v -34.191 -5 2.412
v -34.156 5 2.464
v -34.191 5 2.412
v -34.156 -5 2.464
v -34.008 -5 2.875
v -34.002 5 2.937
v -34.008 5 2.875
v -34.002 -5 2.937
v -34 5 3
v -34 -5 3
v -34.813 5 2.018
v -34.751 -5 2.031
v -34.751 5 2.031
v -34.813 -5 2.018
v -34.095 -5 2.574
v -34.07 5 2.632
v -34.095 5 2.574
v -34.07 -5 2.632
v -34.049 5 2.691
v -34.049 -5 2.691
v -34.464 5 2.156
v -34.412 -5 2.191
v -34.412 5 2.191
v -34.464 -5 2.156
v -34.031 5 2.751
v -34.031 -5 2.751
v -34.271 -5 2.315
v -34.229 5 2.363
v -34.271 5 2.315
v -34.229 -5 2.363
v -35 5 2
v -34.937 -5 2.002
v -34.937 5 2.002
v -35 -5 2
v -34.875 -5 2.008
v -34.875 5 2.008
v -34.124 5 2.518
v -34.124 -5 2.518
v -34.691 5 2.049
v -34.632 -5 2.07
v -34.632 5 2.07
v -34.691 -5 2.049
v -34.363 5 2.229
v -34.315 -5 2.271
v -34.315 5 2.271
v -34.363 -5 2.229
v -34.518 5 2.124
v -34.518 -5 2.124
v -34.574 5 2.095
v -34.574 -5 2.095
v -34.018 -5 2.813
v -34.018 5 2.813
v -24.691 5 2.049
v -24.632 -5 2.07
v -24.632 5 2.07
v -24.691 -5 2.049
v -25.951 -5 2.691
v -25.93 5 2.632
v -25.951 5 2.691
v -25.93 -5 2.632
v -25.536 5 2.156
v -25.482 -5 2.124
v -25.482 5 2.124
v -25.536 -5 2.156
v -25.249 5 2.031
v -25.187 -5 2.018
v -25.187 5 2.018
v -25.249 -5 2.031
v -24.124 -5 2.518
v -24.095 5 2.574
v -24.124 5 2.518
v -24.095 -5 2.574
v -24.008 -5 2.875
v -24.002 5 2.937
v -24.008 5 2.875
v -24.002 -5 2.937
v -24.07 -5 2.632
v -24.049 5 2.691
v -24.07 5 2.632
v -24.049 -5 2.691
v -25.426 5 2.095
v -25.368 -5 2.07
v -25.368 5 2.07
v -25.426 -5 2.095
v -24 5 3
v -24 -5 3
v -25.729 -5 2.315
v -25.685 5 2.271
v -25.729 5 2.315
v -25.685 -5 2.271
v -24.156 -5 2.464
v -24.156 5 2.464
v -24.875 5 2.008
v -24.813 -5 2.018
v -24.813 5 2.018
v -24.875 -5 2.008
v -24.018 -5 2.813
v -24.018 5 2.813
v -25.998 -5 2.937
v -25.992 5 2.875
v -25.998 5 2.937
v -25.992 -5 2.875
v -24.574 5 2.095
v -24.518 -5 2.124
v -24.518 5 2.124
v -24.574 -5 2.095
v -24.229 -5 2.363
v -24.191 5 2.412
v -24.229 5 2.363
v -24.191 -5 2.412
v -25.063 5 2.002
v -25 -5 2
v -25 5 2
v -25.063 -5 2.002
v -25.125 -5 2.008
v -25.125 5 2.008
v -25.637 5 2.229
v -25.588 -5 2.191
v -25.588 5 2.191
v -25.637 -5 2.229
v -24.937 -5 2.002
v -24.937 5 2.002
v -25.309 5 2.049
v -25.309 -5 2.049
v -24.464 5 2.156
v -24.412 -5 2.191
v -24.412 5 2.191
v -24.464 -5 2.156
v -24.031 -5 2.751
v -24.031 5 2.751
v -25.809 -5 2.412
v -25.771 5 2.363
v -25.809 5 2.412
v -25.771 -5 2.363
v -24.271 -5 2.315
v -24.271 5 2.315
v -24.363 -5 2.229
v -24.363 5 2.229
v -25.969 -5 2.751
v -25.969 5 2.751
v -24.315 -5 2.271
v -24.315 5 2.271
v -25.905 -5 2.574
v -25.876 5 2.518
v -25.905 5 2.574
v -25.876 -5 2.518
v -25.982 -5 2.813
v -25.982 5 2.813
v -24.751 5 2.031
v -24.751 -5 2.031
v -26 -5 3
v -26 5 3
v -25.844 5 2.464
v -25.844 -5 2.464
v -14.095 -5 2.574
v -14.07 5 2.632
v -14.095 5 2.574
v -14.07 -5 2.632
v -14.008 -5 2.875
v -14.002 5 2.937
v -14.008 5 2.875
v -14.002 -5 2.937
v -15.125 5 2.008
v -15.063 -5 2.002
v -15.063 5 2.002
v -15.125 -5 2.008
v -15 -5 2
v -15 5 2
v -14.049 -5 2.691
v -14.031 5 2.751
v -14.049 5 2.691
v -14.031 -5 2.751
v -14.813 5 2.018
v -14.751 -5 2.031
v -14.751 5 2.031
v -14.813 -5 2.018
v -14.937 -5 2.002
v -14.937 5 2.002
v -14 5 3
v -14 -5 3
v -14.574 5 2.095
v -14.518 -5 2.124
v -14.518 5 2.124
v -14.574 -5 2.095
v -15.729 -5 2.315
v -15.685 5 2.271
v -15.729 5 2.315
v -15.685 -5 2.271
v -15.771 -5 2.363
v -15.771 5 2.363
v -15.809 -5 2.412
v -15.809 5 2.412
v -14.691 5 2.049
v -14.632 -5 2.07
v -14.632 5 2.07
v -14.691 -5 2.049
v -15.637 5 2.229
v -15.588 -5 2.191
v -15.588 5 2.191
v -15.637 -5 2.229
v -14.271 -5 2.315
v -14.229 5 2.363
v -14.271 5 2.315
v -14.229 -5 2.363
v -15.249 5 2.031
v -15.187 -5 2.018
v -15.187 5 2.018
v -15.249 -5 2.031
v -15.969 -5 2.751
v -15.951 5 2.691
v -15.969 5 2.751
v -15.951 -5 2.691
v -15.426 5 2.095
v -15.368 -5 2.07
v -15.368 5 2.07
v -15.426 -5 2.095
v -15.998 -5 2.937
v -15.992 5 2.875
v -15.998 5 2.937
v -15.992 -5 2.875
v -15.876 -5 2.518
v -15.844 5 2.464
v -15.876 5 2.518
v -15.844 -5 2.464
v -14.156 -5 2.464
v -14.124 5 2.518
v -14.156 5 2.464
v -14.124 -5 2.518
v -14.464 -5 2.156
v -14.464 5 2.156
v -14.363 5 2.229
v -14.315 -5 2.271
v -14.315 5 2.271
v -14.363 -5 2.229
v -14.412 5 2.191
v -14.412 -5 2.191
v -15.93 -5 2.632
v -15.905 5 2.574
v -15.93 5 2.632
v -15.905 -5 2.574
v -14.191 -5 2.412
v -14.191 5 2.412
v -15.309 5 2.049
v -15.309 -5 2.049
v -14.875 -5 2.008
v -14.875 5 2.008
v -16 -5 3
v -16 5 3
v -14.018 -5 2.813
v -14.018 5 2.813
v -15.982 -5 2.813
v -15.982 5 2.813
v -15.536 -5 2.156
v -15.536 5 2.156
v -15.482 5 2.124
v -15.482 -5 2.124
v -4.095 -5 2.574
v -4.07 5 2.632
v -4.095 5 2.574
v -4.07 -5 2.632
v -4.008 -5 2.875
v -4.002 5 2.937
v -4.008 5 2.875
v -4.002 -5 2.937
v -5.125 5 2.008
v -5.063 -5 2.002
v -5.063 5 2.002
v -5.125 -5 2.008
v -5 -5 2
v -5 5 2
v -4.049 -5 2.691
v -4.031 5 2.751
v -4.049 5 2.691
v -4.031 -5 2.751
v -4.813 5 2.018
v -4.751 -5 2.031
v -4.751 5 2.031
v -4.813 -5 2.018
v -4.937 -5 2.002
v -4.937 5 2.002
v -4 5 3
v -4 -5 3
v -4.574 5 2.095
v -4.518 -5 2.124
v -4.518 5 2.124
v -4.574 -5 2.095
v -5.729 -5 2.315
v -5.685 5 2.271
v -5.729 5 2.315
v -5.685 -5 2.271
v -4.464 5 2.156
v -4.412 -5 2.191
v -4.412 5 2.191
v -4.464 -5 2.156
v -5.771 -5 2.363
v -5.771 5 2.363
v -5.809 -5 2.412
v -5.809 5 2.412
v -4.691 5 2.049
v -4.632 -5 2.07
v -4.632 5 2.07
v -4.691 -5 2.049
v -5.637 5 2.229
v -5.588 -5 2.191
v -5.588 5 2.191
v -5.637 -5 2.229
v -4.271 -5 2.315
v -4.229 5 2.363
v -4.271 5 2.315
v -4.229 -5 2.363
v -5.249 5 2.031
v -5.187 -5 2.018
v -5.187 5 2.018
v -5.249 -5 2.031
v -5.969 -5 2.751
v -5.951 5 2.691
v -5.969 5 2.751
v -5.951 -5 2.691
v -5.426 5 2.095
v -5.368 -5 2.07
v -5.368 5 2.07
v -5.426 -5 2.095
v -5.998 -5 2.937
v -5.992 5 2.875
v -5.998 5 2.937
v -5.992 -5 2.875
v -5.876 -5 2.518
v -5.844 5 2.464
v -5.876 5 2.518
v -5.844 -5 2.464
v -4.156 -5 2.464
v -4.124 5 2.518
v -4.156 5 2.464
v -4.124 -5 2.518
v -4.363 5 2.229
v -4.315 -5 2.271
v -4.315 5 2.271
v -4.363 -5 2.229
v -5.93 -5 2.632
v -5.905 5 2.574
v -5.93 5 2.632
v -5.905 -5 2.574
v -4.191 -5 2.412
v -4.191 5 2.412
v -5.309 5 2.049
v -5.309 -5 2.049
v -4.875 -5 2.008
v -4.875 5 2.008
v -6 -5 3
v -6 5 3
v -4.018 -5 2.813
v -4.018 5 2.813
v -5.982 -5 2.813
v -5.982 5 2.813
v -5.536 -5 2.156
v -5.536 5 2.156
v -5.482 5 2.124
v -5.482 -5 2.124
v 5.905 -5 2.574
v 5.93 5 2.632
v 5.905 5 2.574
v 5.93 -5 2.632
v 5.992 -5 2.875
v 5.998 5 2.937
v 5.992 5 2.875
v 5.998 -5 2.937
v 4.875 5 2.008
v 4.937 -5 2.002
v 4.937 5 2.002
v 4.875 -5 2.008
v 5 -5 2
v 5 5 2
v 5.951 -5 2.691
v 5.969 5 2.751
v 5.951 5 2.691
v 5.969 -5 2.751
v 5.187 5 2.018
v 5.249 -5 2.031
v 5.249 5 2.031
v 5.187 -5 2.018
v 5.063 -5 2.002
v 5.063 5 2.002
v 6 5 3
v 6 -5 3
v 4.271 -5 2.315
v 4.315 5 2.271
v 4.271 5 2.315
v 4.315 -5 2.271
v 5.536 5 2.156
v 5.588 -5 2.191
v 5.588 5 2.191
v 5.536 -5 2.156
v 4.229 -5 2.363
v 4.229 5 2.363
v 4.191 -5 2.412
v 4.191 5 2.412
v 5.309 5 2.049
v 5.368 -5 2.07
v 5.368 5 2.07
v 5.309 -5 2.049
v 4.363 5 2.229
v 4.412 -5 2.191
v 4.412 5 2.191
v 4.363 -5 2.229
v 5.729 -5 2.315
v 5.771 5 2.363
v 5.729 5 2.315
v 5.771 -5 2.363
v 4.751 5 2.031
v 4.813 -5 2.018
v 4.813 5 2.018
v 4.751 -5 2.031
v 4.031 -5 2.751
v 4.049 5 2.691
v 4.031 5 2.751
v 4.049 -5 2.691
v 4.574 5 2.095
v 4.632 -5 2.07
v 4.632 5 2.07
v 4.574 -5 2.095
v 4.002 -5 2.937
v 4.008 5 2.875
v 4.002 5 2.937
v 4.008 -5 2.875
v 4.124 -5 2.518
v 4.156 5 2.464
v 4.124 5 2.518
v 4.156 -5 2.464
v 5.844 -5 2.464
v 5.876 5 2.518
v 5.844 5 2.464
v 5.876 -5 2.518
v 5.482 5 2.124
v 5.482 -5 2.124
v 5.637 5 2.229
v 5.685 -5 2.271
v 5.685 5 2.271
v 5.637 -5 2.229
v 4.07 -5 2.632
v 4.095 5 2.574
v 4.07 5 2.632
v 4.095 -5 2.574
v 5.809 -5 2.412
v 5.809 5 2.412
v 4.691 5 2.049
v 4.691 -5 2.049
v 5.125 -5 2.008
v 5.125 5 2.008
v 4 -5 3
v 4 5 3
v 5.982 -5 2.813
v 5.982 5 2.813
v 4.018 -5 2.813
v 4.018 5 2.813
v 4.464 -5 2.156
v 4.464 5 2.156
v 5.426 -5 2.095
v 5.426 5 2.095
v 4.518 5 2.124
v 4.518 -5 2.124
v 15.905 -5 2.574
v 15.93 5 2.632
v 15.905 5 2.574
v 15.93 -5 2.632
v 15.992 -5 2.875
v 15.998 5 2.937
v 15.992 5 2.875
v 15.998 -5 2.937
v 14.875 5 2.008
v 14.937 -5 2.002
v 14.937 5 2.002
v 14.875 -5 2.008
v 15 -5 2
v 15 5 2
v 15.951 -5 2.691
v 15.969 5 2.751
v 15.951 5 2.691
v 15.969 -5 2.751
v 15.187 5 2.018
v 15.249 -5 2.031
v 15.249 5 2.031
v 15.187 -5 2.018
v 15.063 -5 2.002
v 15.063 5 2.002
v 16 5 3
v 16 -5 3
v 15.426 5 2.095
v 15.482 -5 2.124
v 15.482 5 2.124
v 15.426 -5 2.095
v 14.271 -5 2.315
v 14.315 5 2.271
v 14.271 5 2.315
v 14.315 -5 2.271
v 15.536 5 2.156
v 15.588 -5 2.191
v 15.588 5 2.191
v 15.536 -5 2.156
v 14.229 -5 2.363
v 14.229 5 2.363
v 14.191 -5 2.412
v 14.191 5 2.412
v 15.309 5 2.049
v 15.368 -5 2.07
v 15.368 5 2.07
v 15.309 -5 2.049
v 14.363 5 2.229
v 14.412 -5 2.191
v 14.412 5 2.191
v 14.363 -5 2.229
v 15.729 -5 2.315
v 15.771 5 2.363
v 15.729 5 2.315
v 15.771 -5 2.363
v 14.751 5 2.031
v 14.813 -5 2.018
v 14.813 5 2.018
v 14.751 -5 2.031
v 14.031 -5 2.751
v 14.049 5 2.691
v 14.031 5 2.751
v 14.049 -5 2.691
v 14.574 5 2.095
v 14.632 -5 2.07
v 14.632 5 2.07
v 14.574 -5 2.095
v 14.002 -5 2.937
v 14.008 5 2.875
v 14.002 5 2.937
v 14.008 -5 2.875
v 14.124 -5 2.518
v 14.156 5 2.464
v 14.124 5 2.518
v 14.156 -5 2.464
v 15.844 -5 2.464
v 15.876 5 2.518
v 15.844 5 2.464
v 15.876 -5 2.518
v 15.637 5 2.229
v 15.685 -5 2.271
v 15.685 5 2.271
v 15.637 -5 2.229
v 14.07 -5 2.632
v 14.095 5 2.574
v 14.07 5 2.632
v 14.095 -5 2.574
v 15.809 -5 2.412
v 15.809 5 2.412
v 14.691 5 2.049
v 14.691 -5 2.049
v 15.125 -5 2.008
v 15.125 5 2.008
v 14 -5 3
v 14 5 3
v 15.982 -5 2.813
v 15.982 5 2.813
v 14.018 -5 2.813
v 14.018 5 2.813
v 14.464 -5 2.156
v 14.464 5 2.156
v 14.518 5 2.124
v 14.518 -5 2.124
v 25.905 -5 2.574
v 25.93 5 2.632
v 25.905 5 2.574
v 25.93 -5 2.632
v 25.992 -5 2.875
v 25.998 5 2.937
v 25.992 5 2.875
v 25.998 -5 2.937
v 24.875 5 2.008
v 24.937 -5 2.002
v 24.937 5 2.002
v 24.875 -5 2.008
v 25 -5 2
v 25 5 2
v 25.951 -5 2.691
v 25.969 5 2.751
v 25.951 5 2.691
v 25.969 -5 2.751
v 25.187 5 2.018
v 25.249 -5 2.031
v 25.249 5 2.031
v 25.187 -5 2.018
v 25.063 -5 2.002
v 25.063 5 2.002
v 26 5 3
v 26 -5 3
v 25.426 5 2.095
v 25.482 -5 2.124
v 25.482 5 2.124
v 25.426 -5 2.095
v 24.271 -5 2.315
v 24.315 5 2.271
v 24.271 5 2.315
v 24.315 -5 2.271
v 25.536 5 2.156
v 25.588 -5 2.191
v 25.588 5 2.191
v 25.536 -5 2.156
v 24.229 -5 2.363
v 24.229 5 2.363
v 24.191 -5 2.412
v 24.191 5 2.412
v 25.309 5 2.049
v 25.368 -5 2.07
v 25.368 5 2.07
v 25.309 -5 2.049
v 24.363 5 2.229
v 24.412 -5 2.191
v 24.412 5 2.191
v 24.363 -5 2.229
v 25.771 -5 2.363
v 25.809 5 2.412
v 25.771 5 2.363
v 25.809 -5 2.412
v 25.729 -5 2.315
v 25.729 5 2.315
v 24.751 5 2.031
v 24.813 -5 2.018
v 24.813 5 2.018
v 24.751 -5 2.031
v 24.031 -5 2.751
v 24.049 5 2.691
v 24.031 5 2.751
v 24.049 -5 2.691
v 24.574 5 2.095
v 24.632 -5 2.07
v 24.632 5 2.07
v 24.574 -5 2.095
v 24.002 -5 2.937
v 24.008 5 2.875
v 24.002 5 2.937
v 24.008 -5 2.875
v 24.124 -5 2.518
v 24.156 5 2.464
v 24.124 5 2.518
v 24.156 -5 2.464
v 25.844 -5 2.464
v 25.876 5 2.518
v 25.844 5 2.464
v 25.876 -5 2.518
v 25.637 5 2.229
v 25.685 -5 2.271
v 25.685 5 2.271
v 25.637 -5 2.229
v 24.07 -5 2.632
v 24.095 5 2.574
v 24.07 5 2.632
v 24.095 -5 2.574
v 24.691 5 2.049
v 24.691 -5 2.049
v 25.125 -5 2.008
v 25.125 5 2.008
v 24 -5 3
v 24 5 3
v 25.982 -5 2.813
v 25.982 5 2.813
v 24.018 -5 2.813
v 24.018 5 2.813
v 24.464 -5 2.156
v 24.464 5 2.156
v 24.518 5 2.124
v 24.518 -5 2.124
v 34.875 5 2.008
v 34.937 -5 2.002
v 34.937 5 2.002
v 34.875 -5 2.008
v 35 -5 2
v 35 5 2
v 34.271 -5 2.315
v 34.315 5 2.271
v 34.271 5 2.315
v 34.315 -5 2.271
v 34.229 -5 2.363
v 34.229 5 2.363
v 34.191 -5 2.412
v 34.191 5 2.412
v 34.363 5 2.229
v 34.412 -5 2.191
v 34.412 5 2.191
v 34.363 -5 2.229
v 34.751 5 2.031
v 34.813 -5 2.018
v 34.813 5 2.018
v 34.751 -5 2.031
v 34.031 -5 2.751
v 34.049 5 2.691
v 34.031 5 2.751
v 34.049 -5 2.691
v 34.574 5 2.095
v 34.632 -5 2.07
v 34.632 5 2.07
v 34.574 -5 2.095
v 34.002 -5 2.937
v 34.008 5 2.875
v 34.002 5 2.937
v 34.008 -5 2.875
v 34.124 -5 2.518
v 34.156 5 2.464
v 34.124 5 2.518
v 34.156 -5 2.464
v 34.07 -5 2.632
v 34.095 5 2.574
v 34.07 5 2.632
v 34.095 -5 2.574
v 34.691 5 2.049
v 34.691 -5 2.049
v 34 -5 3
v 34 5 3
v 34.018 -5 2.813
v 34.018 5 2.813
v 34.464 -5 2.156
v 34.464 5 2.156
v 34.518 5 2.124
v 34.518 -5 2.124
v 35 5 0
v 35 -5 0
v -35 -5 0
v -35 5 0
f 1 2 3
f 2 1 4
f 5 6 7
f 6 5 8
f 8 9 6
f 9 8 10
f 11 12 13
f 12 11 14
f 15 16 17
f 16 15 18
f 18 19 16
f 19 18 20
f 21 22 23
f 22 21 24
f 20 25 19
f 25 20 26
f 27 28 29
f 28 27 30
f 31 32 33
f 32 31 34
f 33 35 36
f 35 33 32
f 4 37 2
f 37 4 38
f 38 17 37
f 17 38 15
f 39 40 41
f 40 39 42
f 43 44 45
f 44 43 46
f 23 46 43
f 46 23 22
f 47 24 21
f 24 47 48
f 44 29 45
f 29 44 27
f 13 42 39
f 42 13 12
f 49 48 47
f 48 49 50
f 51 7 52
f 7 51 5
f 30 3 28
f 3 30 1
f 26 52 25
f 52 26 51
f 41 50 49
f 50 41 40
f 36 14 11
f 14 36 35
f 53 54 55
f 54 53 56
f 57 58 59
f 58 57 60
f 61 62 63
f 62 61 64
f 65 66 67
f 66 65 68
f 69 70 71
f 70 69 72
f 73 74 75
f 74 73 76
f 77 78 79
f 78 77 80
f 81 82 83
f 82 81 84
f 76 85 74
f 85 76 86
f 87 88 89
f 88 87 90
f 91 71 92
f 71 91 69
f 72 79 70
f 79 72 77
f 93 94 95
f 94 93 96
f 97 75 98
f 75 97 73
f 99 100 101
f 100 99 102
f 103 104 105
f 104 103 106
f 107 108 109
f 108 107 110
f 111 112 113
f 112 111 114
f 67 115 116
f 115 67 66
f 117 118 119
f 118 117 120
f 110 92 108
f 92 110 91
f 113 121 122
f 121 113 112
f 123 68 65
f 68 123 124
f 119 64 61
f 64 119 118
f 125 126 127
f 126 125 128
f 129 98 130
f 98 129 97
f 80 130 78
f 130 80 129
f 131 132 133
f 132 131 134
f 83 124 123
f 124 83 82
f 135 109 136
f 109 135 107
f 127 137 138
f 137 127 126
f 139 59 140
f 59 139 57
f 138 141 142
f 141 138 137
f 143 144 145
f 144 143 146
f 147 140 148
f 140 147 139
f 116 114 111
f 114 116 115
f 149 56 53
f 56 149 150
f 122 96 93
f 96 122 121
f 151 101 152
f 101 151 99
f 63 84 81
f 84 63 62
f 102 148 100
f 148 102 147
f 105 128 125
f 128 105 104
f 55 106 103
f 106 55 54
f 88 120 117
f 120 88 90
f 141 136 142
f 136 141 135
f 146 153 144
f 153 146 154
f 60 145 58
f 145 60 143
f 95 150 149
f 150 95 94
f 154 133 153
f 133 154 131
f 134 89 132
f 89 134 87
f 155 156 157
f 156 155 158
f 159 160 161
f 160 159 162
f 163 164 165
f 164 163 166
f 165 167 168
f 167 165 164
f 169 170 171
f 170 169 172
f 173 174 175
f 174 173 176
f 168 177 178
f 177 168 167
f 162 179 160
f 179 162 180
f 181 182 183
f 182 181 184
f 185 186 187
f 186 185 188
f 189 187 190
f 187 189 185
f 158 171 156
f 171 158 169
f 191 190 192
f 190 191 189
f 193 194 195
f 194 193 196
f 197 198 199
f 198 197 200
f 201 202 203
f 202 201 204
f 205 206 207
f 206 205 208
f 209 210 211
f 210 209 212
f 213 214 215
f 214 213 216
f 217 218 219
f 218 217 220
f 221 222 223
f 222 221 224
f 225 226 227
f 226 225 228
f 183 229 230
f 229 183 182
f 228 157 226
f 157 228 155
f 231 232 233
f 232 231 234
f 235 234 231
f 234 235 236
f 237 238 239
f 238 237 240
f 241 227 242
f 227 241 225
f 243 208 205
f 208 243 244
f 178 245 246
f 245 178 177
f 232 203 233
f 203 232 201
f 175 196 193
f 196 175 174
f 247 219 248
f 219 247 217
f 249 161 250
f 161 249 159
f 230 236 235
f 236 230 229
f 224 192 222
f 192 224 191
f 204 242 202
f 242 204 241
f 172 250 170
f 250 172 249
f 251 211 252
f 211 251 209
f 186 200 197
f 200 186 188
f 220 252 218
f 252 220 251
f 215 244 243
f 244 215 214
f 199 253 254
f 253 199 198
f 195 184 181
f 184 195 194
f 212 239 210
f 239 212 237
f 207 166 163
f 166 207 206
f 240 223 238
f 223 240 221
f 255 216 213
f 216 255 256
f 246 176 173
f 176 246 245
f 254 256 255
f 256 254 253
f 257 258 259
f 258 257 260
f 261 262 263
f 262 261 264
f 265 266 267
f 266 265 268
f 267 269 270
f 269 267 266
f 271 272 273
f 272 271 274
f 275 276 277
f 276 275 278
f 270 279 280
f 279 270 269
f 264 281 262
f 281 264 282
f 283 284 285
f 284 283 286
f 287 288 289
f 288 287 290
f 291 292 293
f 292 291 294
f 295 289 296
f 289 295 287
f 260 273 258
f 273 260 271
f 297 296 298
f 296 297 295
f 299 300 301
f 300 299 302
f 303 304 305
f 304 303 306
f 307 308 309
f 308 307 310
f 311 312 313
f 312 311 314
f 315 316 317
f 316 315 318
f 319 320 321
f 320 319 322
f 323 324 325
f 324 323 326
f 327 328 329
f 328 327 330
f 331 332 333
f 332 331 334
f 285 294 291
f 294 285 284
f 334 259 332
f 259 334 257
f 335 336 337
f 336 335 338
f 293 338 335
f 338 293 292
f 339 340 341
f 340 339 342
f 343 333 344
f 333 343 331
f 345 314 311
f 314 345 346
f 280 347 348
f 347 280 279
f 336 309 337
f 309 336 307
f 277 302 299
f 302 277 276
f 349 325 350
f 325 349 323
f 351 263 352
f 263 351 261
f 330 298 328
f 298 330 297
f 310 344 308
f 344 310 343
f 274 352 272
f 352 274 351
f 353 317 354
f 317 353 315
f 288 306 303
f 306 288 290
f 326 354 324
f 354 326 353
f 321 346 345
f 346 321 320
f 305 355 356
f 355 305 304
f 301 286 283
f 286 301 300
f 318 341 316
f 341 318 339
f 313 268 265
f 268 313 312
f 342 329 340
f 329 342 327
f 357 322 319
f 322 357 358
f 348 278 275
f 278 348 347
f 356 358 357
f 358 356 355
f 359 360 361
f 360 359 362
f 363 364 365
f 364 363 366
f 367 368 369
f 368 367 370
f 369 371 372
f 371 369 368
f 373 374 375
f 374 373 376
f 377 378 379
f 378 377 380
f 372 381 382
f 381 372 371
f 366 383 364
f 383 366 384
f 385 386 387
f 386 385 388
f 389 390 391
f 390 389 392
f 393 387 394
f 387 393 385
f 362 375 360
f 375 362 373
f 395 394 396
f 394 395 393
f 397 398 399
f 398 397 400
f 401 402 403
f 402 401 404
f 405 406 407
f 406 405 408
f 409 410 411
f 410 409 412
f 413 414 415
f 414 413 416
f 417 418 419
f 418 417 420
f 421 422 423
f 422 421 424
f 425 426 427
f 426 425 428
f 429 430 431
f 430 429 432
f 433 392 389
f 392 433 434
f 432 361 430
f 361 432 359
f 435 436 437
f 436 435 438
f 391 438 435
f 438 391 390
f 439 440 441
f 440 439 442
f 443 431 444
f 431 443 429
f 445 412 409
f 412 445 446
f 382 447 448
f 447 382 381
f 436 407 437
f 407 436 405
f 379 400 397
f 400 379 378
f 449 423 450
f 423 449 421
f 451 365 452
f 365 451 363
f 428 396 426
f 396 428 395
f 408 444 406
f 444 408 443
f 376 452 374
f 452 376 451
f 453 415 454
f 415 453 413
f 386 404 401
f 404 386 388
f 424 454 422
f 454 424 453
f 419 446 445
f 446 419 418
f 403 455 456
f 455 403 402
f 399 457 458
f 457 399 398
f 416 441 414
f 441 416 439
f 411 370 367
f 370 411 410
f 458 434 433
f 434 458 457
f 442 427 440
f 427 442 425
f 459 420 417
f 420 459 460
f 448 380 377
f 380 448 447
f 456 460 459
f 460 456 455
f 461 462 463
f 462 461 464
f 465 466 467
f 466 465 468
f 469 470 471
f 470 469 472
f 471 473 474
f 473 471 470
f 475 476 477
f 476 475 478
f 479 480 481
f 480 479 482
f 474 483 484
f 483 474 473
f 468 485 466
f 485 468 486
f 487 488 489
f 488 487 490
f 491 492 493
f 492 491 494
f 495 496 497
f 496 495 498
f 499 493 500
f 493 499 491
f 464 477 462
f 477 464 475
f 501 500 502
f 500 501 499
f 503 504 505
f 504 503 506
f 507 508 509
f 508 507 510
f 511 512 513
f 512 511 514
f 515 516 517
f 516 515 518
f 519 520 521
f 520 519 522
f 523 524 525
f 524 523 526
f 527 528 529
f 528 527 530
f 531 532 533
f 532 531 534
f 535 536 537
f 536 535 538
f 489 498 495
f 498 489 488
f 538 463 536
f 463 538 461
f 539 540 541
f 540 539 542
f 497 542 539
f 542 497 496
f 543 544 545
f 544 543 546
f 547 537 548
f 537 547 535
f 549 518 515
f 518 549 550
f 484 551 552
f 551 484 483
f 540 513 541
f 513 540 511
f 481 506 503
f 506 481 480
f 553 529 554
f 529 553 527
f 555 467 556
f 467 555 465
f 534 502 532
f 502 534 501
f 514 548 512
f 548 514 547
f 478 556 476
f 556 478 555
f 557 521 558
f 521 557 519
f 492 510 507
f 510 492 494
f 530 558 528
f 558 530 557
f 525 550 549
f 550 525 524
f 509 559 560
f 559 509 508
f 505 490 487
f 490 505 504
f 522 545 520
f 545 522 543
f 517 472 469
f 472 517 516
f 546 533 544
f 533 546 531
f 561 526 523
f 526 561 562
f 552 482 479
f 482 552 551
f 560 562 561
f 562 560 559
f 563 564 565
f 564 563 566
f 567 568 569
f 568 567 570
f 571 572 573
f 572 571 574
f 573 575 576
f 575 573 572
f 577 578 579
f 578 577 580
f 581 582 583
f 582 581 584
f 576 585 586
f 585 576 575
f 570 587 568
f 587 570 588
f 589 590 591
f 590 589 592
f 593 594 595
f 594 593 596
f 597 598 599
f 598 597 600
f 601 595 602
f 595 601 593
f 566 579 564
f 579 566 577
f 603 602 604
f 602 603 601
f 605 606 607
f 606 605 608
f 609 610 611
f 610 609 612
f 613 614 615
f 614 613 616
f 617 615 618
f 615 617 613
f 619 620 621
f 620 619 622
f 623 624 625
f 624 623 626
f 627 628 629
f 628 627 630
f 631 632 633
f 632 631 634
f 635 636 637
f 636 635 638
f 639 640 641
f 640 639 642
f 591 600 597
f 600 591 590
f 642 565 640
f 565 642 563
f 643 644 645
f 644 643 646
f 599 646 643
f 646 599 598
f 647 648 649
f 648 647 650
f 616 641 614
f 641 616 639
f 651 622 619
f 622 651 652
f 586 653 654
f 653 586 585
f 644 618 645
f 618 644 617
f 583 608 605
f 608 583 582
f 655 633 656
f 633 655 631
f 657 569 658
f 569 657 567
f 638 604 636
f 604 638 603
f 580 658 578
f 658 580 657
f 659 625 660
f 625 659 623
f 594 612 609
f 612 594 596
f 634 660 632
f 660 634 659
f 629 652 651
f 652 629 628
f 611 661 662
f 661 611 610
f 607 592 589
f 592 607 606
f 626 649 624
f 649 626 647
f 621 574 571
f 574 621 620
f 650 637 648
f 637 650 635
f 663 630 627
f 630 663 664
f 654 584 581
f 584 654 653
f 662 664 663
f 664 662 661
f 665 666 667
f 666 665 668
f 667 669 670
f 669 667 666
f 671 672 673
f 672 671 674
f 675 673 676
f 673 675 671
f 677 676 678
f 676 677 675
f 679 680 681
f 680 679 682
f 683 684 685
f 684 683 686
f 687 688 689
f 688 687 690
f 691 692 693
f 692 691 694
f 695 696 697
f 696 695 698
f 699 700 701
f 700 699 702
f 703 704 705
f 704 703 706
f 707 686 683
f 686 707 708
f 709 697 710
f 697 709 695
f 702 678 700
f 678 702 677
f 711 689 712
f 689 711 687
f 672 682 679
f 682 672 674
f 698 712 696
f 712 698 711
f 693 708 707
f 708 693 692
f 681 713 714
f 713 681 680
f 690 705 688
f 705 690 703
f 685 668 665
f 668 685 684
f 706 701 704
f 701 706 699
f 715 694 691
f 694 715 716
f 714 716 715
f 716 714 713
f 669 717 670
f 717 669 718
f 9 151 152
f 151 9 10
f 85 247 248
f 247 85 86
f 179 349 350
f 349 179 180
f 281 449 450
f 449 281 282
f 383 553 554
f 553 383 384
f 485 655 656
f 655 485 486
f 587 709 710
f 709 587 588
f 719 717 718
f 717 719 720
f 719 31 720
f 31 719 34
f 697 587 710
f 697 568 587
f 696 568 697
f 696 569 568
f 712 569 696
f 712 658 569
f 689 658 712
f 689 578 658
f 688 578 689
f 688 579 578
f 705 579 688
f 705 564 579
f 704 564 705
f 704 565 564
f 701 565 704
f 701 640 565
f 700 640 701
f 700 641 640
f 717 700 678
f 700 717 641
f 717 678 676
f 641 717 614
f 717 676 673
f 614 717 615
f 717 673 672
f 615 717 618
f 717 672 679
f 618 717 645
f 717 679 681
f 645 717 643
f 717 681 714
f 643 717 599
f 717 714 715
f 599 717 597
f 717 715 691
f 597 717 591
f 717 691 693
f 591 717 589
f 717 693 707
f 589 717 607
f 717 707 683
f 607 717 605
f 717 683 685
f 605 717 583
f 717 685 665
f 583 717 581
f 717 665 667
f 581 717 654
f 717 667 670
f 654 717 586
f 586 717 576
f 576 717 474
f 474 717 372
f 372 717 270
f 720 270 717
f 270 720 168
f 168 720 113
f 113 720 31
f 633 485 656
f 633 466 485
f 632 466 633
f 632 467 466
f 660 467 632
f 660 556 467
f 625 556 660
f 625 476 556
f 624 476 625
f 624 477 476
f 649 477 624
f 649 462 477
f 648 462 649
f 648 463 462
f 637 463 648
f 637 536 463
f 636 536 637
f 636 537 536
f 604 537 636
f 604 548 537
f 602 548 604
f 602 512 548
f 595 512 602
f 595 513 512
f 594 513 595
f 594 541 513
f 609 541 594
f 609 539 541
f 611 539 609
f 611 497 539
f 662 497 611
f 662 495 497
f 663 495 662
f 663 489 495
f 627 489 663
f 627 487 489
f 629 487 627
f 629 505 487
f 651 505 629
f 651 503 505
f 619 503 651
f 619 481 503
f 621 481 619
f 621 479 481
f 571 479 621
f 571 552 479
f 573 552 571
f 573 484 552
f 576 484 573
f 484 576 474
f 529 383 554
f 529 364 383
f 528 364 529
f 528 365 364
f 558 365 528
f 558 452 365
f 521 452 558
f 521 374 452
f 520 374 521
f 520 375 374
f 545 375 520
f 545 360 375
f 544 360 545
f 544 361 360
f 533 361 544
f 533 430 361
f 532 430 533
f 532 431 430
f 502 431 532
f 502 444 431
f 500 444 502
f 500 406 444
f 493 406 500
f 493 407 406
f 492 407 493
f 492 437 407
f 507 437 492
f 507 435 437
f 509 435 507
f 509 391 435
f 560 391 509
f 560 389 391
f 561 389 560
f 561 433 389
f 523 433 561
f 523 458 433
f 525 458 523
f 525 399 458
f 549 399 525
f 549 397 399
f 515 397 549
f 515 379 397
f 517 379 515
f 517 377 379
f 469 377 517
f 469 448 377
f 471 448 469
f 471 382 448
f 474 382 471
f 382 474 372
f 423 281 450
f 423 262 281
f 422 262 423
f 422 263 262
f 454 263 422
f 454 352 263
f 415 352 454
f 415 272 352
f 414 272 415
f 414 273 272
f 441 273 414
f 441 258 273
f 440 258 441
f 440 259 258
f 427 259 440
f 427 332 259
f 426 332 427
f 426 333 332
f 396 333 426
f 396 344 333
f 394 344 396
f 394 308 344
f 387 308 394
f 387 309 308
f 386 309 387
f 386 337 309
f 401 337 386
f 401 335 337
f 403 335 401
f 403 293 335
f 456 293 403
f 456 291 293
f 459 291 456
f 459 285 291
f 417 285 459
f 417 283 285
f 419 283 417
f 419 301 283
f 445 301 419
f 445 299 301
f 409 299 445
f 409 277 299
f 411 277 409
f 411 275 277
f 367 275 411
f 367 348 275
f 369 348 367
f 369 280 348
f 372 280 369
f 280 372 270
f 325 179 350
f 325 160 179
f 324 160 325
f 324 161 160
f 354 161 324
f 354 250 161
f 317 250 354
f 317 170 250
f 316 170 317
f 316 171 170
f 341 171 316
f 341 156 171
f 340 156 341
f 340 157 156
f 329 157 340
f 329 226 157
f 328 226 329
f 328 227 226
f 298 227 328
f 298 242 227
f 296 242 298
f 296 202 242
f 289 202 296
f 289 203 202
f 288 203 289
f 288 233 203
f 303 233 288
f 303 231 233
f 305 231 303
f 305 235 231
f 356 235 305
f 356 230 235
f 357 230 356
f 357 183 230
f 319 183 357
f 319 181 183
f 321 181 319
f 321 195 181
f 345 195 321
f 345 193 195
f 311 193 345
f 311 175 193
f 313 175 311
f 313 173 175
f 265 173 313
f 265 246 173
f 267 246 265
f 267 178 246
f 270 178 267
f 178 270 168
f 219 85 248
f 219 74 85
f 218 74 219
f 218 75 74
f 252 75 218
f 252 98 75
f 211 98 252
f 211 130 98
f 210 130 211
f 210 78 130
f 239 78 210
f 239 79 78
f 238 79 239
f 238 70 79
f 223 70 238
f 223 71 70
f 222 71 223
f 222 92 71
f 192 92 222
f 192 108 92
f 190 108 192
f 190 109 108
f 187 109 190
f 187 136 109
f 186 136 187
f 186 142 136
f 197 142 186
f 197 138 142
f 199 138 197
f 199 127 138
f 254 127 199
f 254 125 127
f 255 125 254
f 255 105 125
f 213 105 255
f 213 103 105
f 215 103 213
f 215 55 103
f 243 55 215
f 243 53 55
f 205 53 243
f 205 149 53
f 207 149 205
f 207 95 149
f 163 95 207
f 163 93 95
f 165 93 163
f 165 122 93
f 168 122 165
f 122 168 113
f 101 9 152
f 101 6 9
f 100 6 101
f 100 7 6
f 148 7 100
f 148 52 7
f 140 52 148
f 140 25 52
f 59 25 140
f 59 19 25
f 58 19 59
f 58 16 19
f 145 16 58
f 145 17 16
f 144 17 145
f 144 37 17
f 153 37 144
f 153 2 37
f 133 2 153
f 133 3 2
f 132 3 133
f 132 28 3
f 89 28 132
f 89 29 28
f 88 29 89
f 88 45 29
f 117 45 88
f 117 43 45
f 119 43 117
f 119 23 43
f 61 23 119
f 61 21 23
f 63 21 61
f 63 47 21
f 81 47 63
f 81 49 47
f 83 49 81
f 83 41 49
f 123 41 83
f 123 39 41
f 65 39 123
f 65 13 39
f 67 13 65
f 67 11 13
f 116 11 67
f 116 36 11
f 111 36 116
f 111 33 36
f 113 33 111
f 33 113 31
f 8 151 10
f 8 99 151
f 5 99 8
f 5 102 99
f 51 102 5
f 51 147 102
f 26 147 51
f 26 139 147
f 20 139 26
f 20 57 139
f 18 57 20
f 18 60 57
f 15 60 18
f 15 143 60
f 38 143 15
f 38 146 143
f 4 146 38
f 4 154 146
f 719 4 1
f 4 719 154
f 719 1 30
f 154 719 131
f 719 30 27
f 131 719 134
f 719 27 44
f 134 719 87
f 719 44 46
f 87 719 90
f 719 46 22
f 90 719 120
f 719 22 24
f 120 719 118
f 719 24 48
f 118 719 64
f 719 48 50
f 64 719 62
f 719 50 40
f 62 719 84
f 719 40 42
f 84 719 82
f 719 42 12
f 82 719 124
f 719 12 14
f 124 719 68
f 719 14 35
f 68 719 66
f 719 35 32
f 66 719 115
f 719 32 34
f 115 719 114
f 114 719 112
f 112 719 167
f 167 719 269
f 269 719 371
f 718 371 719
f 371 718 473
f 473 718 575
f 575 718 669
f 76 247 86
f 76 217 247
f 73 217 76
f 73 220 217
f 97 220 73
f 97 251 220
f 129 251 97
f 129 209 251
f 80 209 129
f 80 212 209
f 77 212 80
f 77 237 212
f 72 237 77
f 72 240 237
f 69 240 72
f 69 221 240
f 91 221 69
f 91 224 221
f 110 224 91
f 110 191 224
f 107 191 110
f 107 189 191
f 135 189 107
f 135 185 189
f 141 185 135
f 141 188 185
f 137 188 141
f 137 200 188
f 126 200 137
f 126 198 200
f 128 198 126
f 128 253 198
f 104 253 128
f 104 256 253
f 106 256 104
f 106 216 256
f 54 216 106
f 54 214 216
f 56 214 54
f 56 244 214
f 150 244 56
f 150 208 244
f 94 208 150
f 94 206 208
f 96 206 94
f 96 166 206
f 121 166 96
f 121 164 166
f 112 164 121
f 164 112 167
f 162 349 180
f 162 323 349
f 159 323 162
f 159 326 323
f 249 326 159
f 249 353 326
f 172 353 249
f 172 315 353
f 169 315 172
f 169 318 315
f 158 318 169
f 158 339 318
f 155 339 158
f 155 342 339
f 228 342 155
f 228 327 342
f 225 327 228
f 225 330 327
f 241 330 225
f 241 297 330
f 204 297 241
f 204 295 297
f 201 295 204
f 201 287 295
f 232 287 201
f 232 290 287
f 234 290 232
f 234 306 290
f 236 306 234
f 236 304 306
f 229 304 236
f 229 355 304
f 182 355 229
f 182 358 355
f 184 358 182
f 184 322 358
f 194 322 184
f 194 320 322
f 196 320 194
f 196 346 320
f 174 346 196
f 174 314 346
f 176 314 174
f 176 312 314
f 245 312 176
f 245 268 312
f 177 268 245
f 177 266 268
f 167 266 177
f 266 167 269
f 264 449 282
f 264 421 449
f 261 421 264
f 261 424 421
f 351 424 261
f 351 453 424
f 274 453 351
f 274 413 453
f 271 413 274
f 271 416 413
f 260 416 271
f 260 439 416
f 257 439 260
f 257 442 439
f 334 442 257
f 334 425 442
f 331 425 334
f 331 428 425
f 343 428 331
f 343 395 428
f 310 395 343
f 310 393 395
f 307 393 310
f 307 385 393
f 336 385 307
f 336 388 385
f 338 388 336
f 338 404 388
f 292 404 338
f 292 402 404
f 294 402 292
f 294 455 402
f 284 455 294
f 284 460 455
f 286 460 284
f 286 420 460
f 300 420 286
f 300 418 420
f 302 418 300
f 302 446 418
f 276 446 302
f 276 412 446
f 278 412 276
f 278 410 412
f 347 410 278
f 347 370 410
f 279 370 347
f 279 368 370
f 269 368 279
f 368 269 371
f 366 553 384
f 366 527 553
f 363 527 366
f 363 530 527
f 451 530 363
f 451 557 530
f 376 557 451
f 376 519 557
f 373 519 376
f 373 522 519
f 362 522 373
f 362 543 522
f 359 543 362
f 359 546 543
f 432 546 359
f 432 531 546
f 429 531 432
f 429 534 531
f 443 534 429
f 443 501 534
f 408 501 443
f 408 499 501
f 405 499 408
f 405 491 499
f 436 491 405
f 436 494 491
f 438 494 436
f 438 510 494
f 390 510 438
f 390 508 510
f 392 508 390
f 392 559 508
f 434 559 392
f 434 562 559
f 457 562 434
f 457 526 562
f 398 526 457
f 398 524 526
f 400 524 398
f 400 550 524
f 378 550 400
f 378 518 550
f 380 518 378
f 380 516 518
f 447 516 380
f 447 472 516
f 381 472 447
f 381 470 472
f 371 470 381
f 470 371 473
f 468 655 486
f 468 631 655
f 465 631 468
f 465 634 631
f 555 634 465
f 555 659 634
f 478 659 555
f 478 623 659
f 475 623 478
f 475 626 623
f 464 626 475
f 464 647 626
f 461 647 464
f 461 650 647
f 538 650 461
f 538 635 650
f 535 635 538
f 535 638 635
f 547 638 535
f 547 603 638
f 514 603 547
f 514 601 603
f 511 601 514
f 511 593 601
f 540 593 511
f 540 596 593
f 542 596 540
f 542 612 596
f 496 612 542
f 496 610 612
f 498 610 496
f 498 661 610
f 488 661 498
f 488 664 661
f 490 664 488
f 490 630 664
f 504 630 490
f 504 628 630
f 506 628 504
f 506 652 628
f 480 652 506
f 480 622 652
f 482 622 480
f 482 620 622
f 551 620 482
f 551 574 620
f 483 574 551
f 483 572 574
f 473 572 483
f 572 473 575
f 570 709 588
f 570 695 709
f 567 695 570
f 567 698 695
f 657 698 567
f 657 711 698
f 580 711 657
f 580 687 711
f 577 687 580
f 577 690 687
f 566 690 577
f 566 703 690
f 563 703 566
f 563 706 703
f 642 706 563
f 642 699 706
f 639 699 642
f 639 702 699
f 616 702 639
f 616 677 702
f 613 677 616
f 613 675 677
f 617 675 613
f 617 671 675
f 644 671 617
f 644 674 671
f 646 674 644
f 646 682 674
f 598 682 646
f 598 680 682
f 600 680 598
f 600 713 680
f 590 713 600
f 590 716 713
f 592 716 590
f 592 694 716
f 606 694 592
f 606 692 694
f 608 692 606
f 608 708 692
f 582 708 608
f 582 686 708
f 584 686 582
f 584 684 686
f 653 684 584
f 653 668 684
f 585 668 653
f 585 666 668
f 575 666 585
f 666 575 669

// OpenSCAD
// file: ../modules/rrect.scad
/*
	module to generate rectangle with rounded corners
*/

module rrect(d, r) {
    minr = min(d[0], d[1])/2;
    if (r < minr)
        offset(r)
            offset(-r)
                square(d);
    else
        hull() {
            translate([minr,minr,0])
                circle(minr);
            translate(d[0] > d[1] ? [d[0]-minr,minr,0] : [minr,d[1]-minr,0])
                circle(minr);   
        }
}
// file: ../modules/text_lines.scad
/*
	generate text on multiple lines
	for some reason this feature isn't built into OpenSCAD
*/

module text_lines(
                  lines, 								// number of lines
                  line_height =  2, 					// height of lines
                  line_dist =    3, 					// distance between the center of each line
                  font =         "Ubuntu:style=bold", 	// OpenSCAD font string
                  halign =       "center", 				// horizontal align
                  valign =       "center", 				// vertical align
                  centerline =   true 					// center text around middle line
                 )
    translate([0,
               centerline ?
                    ((len(lines)-1)*line_dist)/2 :
                    0,
               0])
        for (n = [0:len(lines)-1])
            translate([0,-n*line_dist,0])
            text(
                 lines[n],
                 font =      font,
                 halign =    halign,
                 valign =    valign,
                 size =      line_height
                );
// file: ../modules/compound.scad
/*
	create the blank, make the cuts, flatten bumps between cuts
*/

module compound()
	translate([0,0,vertical_center ? profile_height/2 : 0])
    difference() {
        blank();
        cuts();
        cut_flatten();
}
// file: ../modules/cuts.scad
/*
	module to generate the areas of negative space that define the cuts
*/

module cuts()
    for (n = [0:len(cuts_depth)-1])
        cut(depth=cuts_depth[n],
        	space=cuts_space[n],
            axial=cuts_axial[n],
            angle=cuts_angle[n],
            flat=cuts_flat[n]
           );
// file: ../modules/flatten.scad
/* 
	module to flatten the bumps between cuts
	this is to make the key easier to insert
*/

num_cuts = len(cuts_depth);

cuts_depth_with_endpoints = concat(0, cuts_depth, 0);
spacing_mm_with_endpoints = concat(0, cuts_space, blank_length);

module flatten_connect(cut, neighbor) {
    // cuts start at 1, shoulder is 0
    cutout_width = 4;
    delta = spacing_mm_with_endpoints[neighbor] - spacing_mm_with_endpoints[cut];
    left = delta < 0;
    width = (neighbor == 0 || neighbor == num_cuts+1) ? abs(delta)*2 : abs(delta);
    translate([0,spacing_mm_with_endpoints[cut],-cuts_depth_with_endpoints[cut]])
        rotate([0,0,left ? 180 : 0])
            translate([-cutout_width/2,0,0])
                cube([cutout_width,width,profile_height]);    
}

module cut_flatten_bumps()
    for (n = [1:num_cuts]) {
        b = cuts_depth_with_endpoints[n];
        b_r = cuts_depth_with_endpoints[n+1];
        b_l = cuts_depth_with_endpoints[n-1];
        if (b <= b_r)
            //color([0,0,1,0.5])
            flatten_connect(n, n+1);
        if (b <= b_l)
            //color([1,0,0,0.5])
            flatten_connect(n, n-1);
    }

module cut_flatten_tip()
    //color([0,1,0,0.5])
    flatten_connect(num_cuts, num_cuts+1);

module cut_flatten_shoulder()
    //color([0,1,0,0.5])
    flatten_connect(1, 0);


module cut_flatten() {
    translate([0,0,removal_padding]) {
        if (remove_bumps)
            cut_flatten_bumps();
        if (remove_tip)
            cut_flatten_tip();
        if (remove_shoulder)
            cut_flatten_shoulder();
    }
}
// file: ../modules/cut.scad
/*
	module defining cutout for cut
*/


module cut(depth=0,	// how far below the y axis the bottom of the cut is
		   space=0,	// how far away from the shoulder the cut is
		   axial=0,	// axial rotation of the cut
		   flat=0,	// size of the plateau at the bottom of the cut
		   angle=90	// angle of the cut (this does not change depending on the size of the plateau)
		   ) {
    s = sin(90-(angle/2));
    c = cos(90-(angle/2));
    h = profile_height*2;
    rotate([90,0,0])
        translate([0,-depth, -space])
            rotate([0,axial+90,0])
            translate([0,0,-h])
        color([140/255,0,1,1])
        linear_extrude(h*2)
                    polygon([
                             [ flat/2,0],
                             [-flat/2,0],
                             [-c/s*h - flat/2,h],
                             [ c/s*h + flat/2,h]
                            ]);
}
// file: ../modules/blank.scad
/* 
	module to generate extruded version of profile
	some parts of this have been removed at my lawyers insistence
*/

module blank() {
    rotate([90,0,180])
        difference() {
                linear_extrude(blank_length)
                    profile();
                rotate([0,0,profile_rotation])
                    sharpen();
        }
}
// file: ../modules/sharpen.scad
/*
	module to to generate the area of negative space used to make the tip nice and pointy
*/

module sharpen() {
    translate([-profile_height/2+profile_inset,
               -profile_height/2 + tip_offset_top*profile_height,
                blank_length])
        rotate([-tip_angle_top,0,0])
            cube(profile_height-profile_inset*2);
    translate([profile_height/2-profile_inset,
              -profile_height/2 - tip_offset_bottom*profile_height,
               blank_length])
        rotate([-tip_angle_bottom,0,180])
            cube(profile_height-profile_inset*2);
}
// file: ../modules/profile.scad
/*
	module to generate the 2d profile
*/

module profile()
    rotate([0,0,profile_rotation])
                if (profile_use_rectangles)
                        translate([0,-profile_height/2,0])
                            offset(r=-profile_inset)
                                square(
                                       [profile_height * profile_rectangle_width, 
                                        profile_height],
                                       center=true
                                      );
                else
                    offset(r=-profile_inset)
                        rotate([0, profile_flip ? 180 : 0, 0])
                            resize([0, profile_height, 0], auto=true)
                                import(profile_dxf);
// file: ../modules/utils.scad
/*
	General purpose stuff
*/


// variables for left/right (duh)
left = true;
right = false;


// generate an vector of spacings.
// element 0 is for the cut closest to the shoulder
// `face` is the distance between the shoulder and the first cut
// `space` is the distance between subsequent cuts
// `num` is the number of items to generate
// probably just keep this set to a big number
function gen_spacing(face, space, num=100) =
    [for (n = [0:num-1]) n*space+face];


// add a constant to every element in a vector 
function add_offset(N, o) = [for (n = N) n+o];


// generate a vector containing `item` repeated `N` times
function nfill(item, N) = [for (n = [1:N]) item];

// swap x and y values in vector
function rotate_array(a) =
    [for (x = [0:len(a[0])-1]) 
        [for (y = [0:len(a)-1])
            a[y][x]
        ]
    ];


// get an interpolated value between start and end that is `n/N` in between. 
function single_interp(start, end, n, N) = 
        N == 1 ? 
            start :
            (start + (n/(N-1))*(end-start));


// generate a vector starting at `start` and ramping up to `end` with `n` elements
function i1d(start, end, n) =
        [for (i = [0:n-1]) single_interp(start, end, i, n)];


// same thing as i1d() but in 2d
function i2d(start, end, n) = 
        rotate_array(
            [for (p = rotate_array([start,end]))
                i1d(p[0], p[1], n)]
        );
// file: ../modules/shoulder.scad
/*
	modue for creating shoulder stop
*/


// bump up resolution
$fn = 100;


module shoulder_stop(width,		// width of shoulder stop
					 height,	// height of shoulder stop
					 r,			// radius of circles for flared base
					 thickness,	// thickness of shoulder stop
					 clip=0.5	// how much to remove from the ends of the flared base
				 ) {
    sq_w = r*4 + width;  
    module bite() {
        color("green", 1/2)
        union() {
            hull() {
                circle(r);
                translate([0,height])
                    circle(r);
            }
            translate([-r,-r,0])
                square(r);
            }
        }
    rotate([0,90,0])
        translate([0,0,-thickness/2])
            linear_extrude(thickness)
                translate([-sq_w/2,0,0])
                    difference() {
                        square([sq_w,height]);
                        translate([r,r,0])
                            bite();
                        translate([sq_w-r,r,0])
                            rotate([180,0,180])
                                bite();
                        translate([(sq_w/2)-width*1.5-r+clip,0,0])
                            square([width,height]);
                        translate([sq_w-r-clip,0,0])
                            square([width,height]);
                    }
}

//shoulder_stop(width=2, height=5, r=1, thickness=1);
// file: ../modules/bow.scad
/*
	module to generate the bow
*/

$fn = 100;

include <text_lines.scad>
include <rrect.scad>

module bow(
            d=[10,10],
            r=2,
            inset=2,
            in_h=1/2,
            out_h=1,
            text_rotation=0,
            lines=["top","kek"],
            line_height=2,
            line_dist=3,
            font="Ubuntu:style=bold",
            halign="center",
            valign="center",
            centerline=true
           ) {
               
    module text_face()
        linear_extrude(out_h/2)
        text_lines(
                  lines,
                  line_height,
                  line_dist,
                  font,
                  halign,
                  valign,
                  centerline
                 );
        
    rotate([0,90,180]) {
        translate([-d[0]/2,0,0]) {
            translate([0,0,-out_h/2])
            difference() {
                linear_extrude(out_h)
                    rrect([d[0],d[1]],r);
                translate([0,0,-out_h/2])
                    linear_extrude(out_h*2)
                        offset(-inset)
                            rrect([d[0],d[1]],r);
            }
            color("red")
            translate([0,0,-in_h/2])
                linear_extrude(in_h)
                    offset(-inset/2)
                        rrect([d[0],d[1]],r);
        }
 
    translate([0,d[1]/2,0])
        rotate([0,0,text_rotation]) {
            text_face();
                rotate([0,180,0])
                    text_face();
        }
    }
}
// file: ../modules/sidebar.scad
/*
	functions and constants for dealing with the Medeco naming convention for key pins
*/


// definitions for key pin values
K="K"; // fore left
B="B"; // fore center
Q="Q"; // fore right
M="M"; // aft left
D="D"; // aft center
S="S"; // aft right
L="L"; // left
R="R"; // right
C="C"; // center
F="F"; // fore
A="A"; // aft
N="N"; // dead center (neither fore nor aft)


nan = 0/0;

//doesn't support dead

// KBQMDS -> LCR
function datum_to_axial(c) =
    (c == K || c == M) ? L : 
    (c == B || c == D) ? C :
    (c == Q || c == S) ? R : c;

// KBQMDSLCR -> FAN
function datum_to_longitudinal(c) =
    (c == K || c == B || c == Q) ? F : 
    (c == M || c == D || c == S) ? A :
    (c == L || c == C || c == R) ? N : c;

// [KBQMDS] -> [LCR]
function axial_from_code(code) = [for (c = code) datum_to_axial(c)];

// [KBQMDS] -> [FA] 
function longitudinal_from_code(code) = [for (c = code) datum_to_longitudinal(c)];

///////////////////////////////

left_angle = 20;
center_angle = 0;
right_angle = -20;

function datum_to_angle(c) =
    datum_to_axial(c) == L ? left_angle :
    datum_to_axial(c) == C ? center_angle:
    datum_to_axial(c) == R ? right_angle : nan;

function sidebar_to_angles(code) =
    [for (letter = code) datum_to_angle(letter)];


longitudinal_offset = 1.575/2;

function datum_to_distance(c) =
	datum_to_longitudinal(c) == F ? -longitudinal_offset :
	datum_to_longitudinal(c) == A ?  longitudinal_offset : 0;


function sidebar_to_distances(code) = [for (c = code) datum_to_distance(c)];
// file: ../modules/bitting.scad
/*
	array of depths for each cut value
*/

depths = 
         [
/* 0 */    0,
/* 1 */    0.712,
/* 2 */    1.6262,
/* 3 */    2.0612,
/* 4 */    2.6962,
/* 5 */    3.3312,
/* 6 */    4.0
         ];

// depths, but zero element is guaranteed to be zero depth
depths_true_zero = concat(0,depths);


// round cut value down to nearest neighbor
function depth_floor(n) =
    depths_true_zero[n+1];


// interpolate between cut values
function depth_interp(n) =
    lookup(n,
        [for (n = [-1:len(depths)-1]) [n, depth_floor(n)]]);


// round cut value to nearest neighbor
function depth_round(n) =
    depth_floor(round(n));


// round cut value up to nearest neighbor
function depth_ceil(n) =
    depth_floor(ceil(n));


// apply these functions to vectors
// holy shit OpenSCAD needs to implement higher order functions
// please
function depths_floor (N) = [for (n = N) depth_floor (n)];
function depths_interp(N) = [for (n = N) depth_interp(n)];
function depths_round (N) = [for (n = N) depth_round (n)];
function depths_ceil  (N) = [for (n = N) depth_ceil  (n)];
function depths(N)		  = [for (n = N) depth_interp(n)];
// file: ../modules/units.scad
/*
	Functions for unit conversions.
	These assume the default unit is milimeter.
*/

// abbreviations
function um(n) = n/1000;
function mm(n) = n;
function cm(n) = n*10;
function in(n) = n*25.4;


// full name
function micron(n) = um(n);
function micrometer(n) = um(n);
function milimeter(n) = mm(n);
function centimeter(n) = cm(n);
function inch(n) = in(n);
function mil(n) = in(n)/1000;
function thou(n) = in(n)/1000;

// full name plural
function microns(n) = um(n);
function micrometers(n) = um(n);
function milimeters(n) = mm(n);
function centimeters(n) = cm(n);
function inches(n) = in(n);
function mils(n) = mil(n);
function thous(n) = thou(n);
// file: ../modules/blade.scad
/*
	create blade of key
*/

module blade(
				// location of dxf file containing profile
                profile_dxf =               "example_keyway.dxf",
                // how much material to remove from the edges of the profile
                profile_inset =             0,
                // horizontally flip the profile
                profile_flip =              false,
                // distance between top and bottom of profile
                profile_height =            7,
                // degrees to rotate profile (without rotating cuts)
                profile_rotation =          0,
                // distance from shoulder to tip
                blank_length =              30,
                // vector of depths for each cut, starting closest to shoulder
                cuts_depth =                [2.80, 3.43, 1.53, 2.16, 3.43],
                // vector of spacings for each cut, starting closest to shoulder
                cuts_space =                [6.2, 10.52, 14.84, 19.16, 23.48],
                // vector of axial rotations for each cut, starting closest to shoulder
                cuts_axial =                nfill(0, 100),
                // vector of plateau sizes for each cut, starting closest to shoulder
                cuts_flat =                 nfill(38/100,100),
                // vector of angles for each cut, starting closest to shoulder
                cuts_angle =                nfill(90, 100),
                // top angle of tip of key
                tip_angle_top =             45,
                // bottom angle of tip of key
                tip_angle_bottom =          45,
                // how far up to move the top angle
                tip_offset_top =            0,
                // how far down to move the bottom angle
                tip_offset_bottom =         0,
                // remove extraneous material between cuts to strengthen the key and make it insert more easily
                remove_bumps =              false,
                // same thing but the last bump
                remove_tip =                false,
                // same thing but the first bump
                remove_shoulder =           false,
                // how much bump material to leave
                removal_padding =           0.5,
                // turn the profile into a rectangle (useful for testing)
                profile_use_rectangles =    true,
                // width of aforementioned rectangle
                profile_rectangle_width =   0.5,
                // center blade vertically with respect to y axis
                vertical_center =           false
            ) {
    include <profile.scad>
    include <sharpen.scad>
    include <blank.scad>
    include <cut.scad>
    include <flatten.scad>
    include <cuts.scad>
    include <compound.scad>
    compound();    
}
// main file
/*
    this file creates a lot of keys
    
    every parameter for each key can be gradually changed from one side to the other
    
*/

include <../modules/blade.scad>
include <../modules/units.scad>
include <../modules/bitting.scad>
include <../modules/sidebar.scad>
include <../modules/bow.scad>
include <../modules/shoulder.scad>
include <../modules/utils.scad>

function i1dn(a, b) = i1d(a, b, num_keys);
function i2dn(a, b) = i2d(a, b, num_keys);
function kfill(n) = nfill(n, num_keys);


num_keys = 7;

cuts_depth_ = kfill([0,0,0,0,0],[6,6,6,6,6]);

colors = i2dn([0.7,0.2,0.6],[1,0.5,0]);


profile_insets = i1d(0,0.4, num_keys);

module intermediate_blade(n)
	color(colors[n])
	blade(
		vertical_center = 			true,
		profile_use_rectangles = 	false, 
		cuts_depth = 				cuts_depth_[n],
        profile_inset =             profile_insets[n]
	);



module blades()
	for (n = [0:num_keys-1])
		translate([n*center_dist,0,0])
		rotate([90,0,0])
			intermediate_blade(n);		


center_dist = 10;
base_thickness = 3;
base_width = 10;


module base()
	translate([-center_dist/2,-base_width/2,-base_thickness])
		cube([center_dist*(num_keys-1)+center_dist, base_width, base_thickness]);

module score_polygon()
	circle(1);

module scoring()
	for (n = [0:num_keys])
		translate([n*center_dist-center_dist/2,base_width,0])
			rotate([90,0,0])
				linear_extrude(base_width*2)
					score_polygon();


translate([(-num_keys+1)*center_dist/2,0,base_thickness])
difference() {
	union() {
		blades();
		base();
	}
	scoring();
}
